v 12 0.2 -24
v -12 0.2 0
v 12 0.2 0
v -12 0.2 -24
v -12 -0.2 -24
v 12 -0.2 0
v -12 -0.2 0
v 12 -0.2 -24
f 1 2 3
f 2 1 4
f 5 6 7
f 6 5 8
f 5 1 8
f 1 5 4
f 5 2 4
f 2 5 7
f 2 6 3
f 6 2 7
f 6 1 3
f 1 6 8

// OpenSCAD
// file: ../p/box.scad
use <../lib.scad>
function ldraw_lib__box() = [
// 0 Box 6 (six faces)
// 0 Name: box.dat
// 0 Author: James Jessiman
// 0 !LDRAW_ORG Primitive UPDATE 2002-05
// 0 !LICENSE Licensed under CC BY 2.0 and CC BY 4.0 : see CAreadme.txt
// 
// 0 BFC CERTIFY CCW
  [0,"BFC","CERTIFY"],
  [0,"BFC","CCW"],
// 
// 0 !HISTORY 2002-08-22 [sbliss] Applied BFC
// 0 !HISTORY 2002-11-30 [PTadmin] Official Update 2002-05
// 0 !HISTORY 2007-06-24 [PTadmin] Header formatted for Contributor Agreement
// 0 !HISTORY 2008-07-01 [PTadmin] Official Update 2008-01
// 
// 
// 2 24 1 1 1 -1 1 1
  [2,24,1,1,1,-1,1,1],
// 2 24 -1 1 1 -1 1 -1
  [2,24,-1,1,1,-1,1,-1],
// 2 24 -1 1 -1 1 1 -1
  [2,24,-1,1,-1,1,1,-1],
// 2 24 1 1 -1 1 1 1
  [2,24,1,1,-1,1,1,1],
// 2 24 1 -1 1 -1 -1 1
  [2,24,1,-1,1,-1,-1,1],
// 2 24 -1 -1 1 -1 -1 -1
  [2,24,-1,-1,1,-1,-1,-1],
// 2 24 -1 -1 -1 1 -1 -1
  [2,24,-1,-1,-1,1,-1,-1],
// 2 24 1 -1 -1 1 -1 1
  [2,24,1,-1,-1,1,-1,1],
// 2 24 1 -1 1 1 1 1
  [2,24,1,-1,1,1,1,1],
// 2 24 -1 -1 1 -1 1 1
  [2,24,-1,-1,1,-1,1,1],
// 2 24 1 -1 -1 1 1 -1
  [2,24,1,-1,-1,1,1,-1],
// 2 24 -1 -1 -1 -1 1 -1
  [2,24,-1,-1,-1,-1,1,-1],
// 4 16 1 1 1 1 1 -1 -1 1 -1 -1 1 1
  [4,16,1,1,1,1,1,-1,-1,1,-1,-1,1,1],
// 4 16 -1 -1 -1 1 -1 -1 1 -1 1 -1 -1 1
  [4,16,-1,-1,-1,1,-1,-1,1,-1,1,-1,-1,1],
// 4 16 -1 -1 1 1 -1 1 1 1 1 -1 1 1
  [4,16,-1,-1,1,1,-1,1,1,1,1,-1,1,1],
// 4 16 -1 -1 -1 -1 -1 1 -1 1 1 -1 1 -1
  [4,16,-1,-1,-1,-1,-1,1,-1,1,1,-1,1,-1],
// 4 16 1 -1 -1 -1 -1 -1 -1 1 -1 1 1 -1
  [4,16,1,-1,-1,-1,-1,-1,-1,1,-1,1,1,-1],
// 4 16 1 -1 1 1 -1 -1 1 1 -1 1 1 1
  [4,16,1,-1,1,1,-1,-1,1,1,-1,1,1,1],
// 0
];
makepoly(ldraw_lib__box(), line=0.2);
// main file
use <../lib.scad>
use <../p/box.scad>
function ldraw_lib__u8039() = [
// 0 ~Mursten Glass for Window  1 x  6 x  3 with Shutters
// 0 Name: u8039.dat
// 0 Author: Steffen [Steffen]
// 0 !LDRAW_ORG Part UPDATE 2019-02
// 0 !LICENSE Licensed under CC BY 2.0 and CC BY 4.0 : see CAreadme.txt
// 
// 0 BFC CERTIFY CCW
  [0,"BFC","CERTIFY"],
  [0,"BFC","CCW"],
// 
// 0 !CATEGORY Window
// 0 !KEYWORDS Automatic Binding Brick
// 
// 0 !CMDLINE -c47
// 
// 0 !HISTORY 2019-09-09 [PTadmin] Official Update 2019-02
// 
// 
// 1 16 0 30 0 30 0 0 0 0 30 0 0.5 0 box.dat
  [1,16,0,30,0,30,0,0,0,0,30,0,0.5,0, ldraw_lib__box()],
];
makepoly(ldraw_lib__u8039(), line=0.2);
